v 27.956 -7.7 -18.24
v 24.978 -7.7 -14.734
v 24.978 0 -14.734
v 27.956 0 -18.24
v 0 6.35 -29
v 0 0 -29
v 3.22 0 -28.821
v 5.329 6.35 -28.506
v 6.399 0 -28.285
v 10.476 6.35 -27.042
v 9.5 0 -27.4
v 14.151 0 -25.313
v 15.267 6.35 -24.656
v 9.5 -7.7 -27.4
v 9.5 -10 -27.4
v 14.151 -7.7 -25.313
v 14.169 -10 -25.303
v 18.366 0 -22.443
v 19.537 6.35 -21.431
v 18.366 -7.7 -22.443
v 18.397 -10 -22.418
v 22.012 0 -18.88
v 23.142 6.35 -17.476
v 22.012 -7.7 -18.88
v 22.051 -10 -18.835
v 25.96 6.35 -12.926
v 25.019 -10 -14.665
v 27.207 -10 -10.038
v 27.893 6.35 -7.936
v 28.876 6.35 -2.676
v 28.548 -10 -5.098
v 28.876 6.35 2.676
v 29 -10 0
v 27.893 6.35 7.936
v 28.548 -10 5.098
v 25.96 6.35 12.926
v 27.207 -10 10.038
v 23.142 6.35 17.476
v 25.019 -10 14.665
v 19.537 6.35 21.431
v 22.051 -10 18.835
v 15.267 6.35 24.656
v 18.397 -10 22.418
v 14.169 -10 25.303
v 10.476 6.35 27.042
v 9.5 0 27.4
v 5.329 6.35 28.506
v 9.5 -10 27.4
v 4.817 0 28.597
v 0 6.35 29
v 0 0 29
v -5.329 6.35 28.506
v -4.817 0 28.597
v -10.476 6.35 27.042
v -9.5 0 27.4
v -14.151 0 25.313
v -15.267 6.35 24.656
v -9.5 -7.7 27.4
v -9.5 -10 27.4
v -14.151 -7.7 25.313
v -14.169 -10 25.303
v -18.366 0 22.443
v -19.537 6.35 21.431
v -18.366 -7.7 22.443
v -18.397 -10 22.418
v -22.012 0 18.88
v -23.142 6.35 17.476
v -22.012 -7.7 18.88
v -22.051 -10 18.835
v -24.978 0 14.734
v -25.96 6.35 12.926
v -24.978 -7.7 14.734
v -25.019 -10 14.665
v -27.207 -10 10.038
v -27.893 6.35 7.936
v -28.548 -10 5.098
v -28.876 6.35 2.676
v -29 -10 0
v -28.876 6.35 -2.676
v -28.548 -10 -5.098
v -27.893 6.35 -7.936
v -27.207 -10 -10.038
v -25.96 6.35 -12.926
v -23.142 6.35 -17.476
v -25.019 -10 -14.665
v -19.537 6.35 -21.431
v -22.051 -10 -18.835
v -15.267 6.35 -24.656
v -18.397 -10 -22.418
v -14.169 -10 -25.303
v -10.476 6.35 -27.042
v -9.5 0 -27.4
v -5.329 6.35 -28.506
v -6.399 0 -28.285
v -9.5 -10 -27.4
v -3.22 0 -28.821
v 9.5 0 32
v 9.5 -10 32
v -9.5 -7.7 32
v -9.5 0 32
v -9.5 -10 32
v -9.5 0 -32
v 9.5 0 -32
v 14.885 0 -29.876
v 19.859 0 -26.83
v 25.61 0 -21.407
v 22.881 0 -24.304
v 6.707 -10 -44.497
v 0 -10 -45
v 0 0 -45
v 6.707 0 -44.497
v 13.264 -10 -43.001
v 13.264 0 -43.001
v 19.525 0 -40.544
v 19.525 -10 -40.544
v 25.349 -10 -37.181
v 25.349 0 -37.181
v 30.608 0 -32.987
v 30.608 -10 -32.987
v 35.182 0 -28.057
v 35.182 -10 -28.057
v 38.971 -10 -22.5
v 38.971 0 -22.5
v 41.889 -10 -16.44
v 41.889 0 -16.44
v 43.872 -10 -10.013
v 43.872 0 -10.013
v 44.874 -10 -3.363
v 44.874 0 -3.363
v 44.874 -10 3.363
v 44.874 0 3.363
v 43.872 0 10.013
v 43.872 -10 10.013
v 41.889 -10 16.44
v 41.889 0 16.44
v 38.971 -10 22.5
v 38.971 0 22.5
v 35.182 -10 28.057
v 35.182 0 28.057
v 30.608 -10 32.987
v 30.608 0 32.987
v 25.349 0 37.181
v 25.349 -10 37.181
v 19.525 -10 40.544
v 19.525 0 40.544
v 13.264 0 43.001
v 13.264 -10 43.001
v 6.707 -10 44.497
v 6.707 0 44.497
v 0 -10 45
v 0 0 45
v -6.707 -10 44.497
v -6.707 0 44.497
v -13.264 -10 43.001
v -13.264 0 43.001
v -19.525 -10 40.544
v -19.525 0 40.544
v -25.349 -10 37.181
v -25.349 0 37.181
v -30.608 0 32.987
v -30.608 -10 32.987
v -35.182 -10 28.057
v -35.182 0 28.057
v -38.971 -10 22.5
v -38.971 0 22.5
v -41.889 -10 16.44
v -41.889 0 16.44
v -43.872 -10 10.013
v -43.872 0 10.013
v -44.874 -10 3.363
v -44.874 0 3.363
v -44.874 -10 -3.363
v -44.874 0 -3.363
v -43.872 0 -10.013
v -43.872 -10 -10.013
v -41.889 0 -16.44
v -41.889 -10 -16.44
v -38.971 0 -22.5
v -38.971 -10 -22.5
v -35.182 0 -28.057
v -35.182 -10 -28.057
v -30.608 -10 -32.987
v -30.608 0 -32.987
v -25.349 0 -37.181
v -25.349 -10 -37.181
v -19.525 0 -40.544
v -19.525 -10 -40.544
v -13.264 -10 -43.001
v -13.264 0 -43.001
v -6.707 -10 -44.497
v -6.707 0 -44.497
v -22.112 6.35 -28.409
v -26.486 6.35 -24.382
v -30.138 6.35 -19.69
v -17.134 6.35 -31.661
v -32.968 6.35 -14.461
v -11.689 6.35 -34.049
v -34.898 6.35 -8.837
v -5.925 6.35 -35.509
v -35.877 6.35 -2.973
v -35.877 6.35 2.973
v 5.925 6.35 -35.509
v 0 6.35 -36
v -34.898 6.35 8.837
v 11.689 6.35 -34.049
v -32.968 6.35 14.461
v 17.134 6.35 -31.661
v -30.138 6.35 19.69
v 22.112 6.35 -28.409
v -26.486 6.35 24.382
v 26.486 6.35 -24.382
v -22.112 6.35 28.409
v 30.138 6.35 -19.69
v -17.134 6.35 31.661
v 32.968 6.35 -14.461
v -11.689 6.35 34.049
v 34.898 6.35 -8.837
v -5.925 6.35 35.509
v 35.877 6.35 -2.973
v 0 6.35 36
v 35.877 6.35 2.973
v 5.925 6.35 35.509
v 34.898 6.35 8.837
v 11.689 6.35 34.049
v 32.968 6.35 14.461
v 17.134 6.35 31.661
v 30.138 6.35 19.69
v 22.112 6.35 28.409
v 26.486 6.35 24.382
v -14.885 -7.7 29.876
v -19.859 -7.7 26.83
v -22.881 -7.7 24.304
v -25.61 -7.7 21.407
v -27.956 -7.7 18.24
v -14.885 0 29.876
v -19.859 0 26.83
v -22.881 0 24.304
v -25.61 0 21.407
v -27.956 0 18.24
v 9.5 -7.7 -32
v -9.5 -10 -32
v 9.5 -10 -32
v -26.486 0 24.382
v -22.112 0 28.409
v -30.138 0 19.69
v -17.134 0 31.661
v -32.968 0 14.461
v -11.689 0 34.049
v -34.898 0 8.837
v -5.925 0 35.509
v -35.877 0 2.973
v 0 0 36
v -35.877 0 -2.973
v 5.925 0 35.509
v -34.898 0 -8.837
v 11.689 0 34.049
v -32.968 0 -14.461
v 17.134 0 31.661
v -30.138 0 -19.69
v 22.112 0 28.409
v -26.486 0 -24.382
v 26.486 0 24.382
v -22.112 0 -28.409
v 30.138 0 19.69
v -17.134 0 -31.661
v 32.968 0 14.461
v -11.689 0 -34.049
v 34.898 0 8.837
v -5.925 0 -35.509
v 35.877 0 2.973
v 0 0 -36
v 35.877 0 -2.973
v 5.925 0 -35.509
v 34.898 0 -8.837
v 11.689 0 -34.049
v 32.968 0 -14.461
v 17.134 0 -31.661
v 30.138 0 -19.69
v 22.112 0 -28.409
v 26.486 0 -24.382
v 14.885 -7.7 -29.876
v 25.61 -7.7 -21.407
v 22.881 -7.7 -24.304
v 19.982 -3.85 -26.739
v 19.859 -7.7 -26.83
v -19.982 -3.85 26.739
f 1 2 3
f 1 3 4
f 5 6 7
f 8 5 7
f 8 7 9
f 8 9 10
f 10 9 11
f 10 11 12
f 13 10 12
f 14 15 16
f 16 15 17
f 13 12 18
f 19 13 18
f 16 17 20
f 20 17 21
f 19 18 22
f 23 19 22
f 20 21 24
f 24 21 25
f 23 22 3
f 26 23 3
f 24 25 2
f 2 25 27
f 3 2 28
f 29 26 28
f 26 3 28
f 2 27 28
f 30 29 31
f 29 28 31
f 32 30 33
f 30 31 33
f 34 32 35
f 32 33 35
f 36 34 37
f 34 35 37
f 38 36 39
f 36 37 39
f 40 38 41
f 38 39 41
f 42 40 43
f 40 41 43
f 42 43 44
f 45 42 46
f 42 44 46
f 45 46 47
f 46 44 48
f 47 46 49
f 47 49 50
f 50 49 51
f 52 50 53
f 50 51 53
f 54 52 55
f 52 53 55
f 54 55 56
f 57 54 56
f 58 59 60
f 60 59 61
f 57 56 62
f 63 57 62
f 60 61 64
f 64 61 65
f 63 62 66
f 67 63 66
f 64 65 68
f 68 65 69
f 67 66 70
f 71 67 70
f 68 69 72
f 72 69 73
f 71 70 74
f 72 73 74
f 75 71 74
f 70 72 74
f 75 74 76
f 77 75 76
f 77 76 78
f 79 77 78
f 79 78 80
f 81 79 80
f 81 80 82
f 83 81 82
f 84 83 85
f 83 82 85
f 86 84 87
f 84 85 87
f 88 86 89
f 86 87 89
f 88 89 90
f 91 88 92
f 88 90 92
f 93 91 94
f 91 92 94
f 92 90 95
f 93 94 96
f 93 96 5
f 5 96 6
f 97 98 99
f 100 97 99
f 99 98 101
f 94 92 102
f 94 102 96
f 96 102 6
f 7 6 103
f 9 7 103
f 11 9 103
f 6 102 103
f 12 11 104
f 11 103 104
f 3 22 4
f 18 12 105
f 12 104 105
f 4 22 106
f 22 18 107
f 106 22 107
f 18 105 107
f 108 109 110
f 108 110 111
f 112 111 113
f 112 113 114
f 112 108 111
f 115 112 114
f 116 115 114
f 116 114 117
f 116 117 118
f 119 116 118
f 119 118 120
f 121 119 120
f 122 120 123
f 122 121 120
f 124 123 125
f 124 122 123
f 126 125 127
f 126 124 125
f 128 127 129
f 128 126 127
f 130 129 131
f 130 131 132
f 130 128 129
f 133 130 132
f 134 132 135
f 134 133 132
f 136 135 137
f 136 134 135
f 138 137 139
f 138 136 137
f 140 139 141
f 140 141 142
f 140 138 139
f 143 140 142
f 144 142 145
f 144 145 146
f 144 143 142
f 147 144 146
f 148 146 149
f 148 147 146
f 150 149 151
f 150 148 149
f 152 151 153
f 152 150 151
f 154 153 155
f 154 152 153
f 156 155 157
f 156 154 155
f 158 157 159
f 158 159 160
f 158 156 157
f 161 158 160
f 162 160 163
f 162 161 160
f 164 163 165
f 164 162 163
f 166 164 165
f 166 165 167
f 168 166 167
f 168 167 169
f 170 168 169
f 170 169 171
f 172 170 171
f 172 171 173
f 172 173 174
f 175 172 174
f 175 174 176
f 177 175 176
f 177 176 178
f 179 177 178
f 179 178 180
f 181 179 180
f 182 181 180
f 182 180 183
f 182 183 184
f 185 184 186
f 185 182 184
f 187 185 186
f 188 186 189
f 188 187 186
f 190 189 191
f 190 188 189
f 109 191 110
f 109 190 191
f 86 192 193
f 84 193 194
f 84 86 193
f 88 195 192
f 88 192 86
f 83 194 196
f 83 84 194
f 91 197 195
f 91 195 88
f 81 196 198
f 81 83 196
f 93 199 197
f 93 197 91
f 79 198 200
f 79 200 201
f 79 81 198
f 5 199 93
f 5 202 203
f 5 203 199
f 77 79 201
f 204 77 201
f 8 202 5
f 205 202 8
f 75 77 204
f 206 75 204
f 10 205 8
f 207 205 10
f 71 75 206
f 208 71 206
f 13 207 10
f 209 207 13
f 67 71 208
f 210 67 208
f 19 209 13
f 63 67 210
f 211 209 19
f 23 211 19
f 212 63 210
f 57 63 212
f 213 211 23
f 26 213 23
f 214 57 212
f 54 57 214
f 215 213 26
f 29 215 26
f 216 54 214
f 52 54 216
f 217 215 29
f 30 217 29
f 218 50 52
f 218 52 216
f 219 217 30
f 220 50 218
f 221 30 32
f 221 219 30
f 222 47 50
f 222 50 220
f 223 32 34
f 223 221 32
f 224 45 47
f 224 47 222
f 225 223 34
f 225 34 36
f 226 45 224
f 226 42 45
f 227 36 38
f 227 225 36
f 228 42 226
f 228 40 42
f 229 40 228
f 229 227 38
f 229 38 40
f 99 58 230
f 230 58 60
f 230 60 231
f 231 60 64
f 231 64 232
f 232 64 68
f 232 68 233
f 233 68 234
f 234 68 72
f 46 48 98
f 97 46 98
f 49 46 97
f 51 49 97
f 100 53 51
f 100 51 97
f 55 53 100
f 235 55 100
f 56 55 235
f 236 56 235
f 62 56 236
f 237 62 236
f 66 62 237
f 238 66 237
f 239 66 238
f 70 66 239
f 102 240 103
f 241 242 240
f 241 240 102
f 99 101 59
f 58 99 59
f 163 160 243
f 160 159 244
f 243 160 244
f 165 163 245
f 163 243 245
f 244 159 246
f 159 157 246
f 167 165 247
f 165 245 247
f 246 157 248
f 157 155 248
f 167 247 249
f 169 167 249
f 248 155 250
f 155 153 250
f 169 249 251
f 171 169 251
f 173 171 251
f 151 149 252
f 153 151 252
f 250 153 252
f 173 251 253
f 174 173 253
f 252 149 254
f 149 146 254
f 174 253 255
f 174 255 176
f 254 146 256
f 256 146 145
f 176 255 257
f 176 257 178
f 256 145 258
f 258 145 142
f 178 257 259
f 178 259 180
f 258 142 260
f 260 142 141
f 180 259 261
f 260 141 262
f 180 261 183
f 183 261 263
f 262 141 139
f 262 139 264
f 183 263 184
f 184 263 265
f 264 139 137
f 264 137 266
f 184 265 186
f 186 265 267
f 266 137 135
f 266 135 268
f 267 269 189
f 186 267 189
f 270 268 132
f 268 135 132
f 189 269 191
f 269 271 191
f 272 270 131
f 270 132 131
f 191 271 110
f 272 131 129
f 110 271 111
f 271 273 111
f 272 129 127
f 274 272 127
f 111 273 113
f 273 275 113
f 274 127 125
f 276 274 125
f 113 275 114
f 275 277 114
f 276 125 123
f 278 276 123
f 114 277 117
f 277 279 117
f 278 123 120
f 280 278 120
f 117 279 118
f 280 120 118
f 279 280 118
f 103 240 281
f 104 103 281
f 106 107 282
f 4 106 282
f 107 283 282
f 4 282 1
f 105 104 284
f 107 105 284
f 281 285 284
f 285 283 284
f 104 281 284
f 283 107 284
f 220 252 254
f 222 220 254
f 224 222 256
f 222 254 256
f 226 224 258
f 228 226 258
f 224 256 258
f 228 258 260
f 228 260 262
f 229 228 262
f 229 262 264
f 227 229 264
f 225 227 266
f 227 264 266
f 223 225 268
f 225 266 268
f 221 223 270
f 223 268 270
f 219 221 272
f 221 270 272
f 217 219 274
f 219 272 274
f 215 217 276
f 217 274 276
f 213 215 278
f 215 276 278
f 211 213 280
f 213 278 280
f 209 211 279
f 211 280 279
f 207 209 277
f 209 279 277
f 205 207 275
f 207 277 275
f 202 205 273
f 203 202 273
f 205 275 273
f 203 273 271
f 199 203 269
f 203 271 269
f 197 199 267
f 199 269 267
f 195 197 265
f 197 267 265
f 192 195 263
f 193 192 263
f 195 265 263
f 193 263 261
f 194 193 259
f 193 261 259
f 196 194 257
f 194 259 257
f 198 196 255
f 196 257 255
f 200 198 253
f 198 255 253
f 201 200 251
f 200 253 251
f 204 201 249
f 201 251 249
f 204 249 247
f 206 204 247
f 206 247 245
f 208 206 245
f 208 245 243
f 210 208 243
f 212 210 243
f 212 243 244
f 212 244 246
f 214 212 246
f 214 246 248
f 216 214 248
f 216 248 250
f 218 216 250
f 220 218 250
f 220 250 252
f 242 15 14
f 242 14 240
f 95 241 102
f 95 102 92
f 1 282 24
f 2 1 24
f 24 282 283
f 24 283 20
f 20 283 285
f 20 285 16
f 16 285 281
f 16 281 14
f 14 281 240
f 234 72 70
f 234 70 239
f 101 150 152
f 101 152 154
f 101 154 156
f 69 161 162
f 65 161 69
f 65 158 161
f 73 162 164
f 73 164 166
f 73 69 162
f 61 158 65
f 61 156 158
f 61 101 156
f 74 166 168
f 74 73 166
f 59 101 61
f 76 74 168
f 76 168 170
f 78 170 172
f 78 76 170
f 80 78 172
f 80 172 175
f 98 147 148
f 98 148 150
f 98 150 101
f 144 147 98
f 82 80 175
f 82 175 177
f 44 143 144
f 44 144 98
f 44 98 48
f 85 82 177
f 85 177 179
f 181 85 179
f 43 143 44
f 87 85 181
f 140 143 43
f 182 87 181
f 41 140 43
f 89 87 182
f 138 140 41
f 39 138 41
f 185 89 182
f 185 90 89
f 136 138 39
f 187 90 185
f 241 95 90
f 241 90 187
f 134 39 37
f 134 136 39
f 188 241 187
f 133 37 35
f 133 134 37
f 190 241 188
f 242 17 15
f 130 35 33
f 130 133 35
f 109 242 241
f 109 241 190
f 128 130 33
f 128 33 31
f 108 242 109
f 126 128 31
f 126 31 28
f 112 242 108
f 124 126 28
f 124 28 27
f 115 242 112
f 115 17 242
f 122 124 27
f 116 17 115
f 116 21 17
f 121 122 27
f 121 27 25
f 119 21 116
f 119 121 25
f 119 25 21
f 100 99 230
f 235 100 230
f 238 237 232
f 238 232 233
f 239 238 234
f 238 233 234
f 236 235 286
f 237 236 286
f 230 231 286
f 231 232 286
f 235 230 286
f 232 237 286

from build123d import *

# Parameters (mm, degrees)
SKETCH1_R           = 36
BOSS_EXTRUDE1_DEPTH = 6.35
SKETCH2_R           = 29
CUT_EXTRUDE1_DEPTH  = 52.306164347
BOSS_EXTRUDE2_START = 10
SKETCH3_R           = 45
SKETCH3_R_2         = 29
BOSS_EXTRUDE2_DEPTH = 10
CUT_EXTRUDE2_DEPTH  = 10
CUT_SWEEP1_START    = -7.7
CUT_SWEEP1_DEPTH    = 7.7
CUT_SWEEP2_START    = -7.7
CUT_SWEEP2_DEPTH    = 7.7


# Read off the part's stored shape, not the designer's step: Cut-Sweep1, Cut-Sweep2
with BuildPart() as part:
    # Sketch1 → Boss-Extrude1 (new body)
    with BuildSketch(Plane(origin=(0, 0, 0), x_dir=(1, 0, 0), z_dir=(0, 1, 0))):
        with Locations(Location((0, 0, 0), (0, 0, 270))):
            Circle(SKETCH1_R)
    extrude(amount=BOSS_EXTRUDE1_DEPTH)

    # Sketch2 → Cut-Extrude1 (cut, through all)
    with BuildSketch(Plane(origin=(0, 0, 0), x_dir=(-1, 0, 0), z_dir=(0, -1, 0))):
        with Locations(Location((0, 0, 0), (0, 0, 90))):
            Circle(SKETCH2_R)
    extrude(amount=-CUT_EXTRUDE1_DEPTH, mode=Mode.SUBTRACT)

    # Sketch3 → Boss-Extrude2 (add)
    with BuildSketch(Plane.XZ.offset(BOSS_EXTRUDE2_START)):
        with Locations(Location((0, 0, 0), (0, 0, 270))):
            Circle(SKETCH3_R)
        with Locations(Location((0, 0, 0), (0, 0, 270))):
            Circle(SKETCH3_R_2, mode=Mode.SUBTRACT)
    extrude(amount=-BOSS_EXTRUDE2_DEPTH)

    # Sketch6 → Cut-Extrude2 (cut)
    with BuildSketch(Plane(origin=(0, -10, 0), x_dir=(-1, 0, 0), z_dir=(0, -1, 0))):
        with BuildLine():
            Line((9.5, -29), (9.5, -27.399817518))
            ThreePointArc((9.5, -27.399817518), (0, -29), (-9.5, -27.399817518))
            Line((-9.5, -27.399817518), (-9.5, -29))
            Line((-9.5, -29), (-9.5, -32))
            Line((-9.5, -32), (9.5, -32))
            Line((9.5, -32), (9.5, -29))
        make_face()
        with BuildLine():
            Line((9.5, 29), (9.5, 27.399817518))
            ThreePointArc((9.5, 27.399817518), (0, 29), (-9.5, 27.399817518))
            Line((-9.5, 27.399817518), (-9.5, 29))
            Line((-9.5, 29), (-9.5, 32))
            Line((-9.5, 32), (9.5, 32))
            Line((9.5, 32), (9.5, 29))
        make_face()
    extrude(amount=-CUT_EXTRUDE2_DEPTH, mode=Mode.SUBTRACT)

    # Cut-Sweep1 outline → Cut-Sweep1 (cut)
    with BuildSketch(Plane(origin=(0, 0, 0), x_dir=(1, 0, 0), z_dir=(0, 1, 0)).offset(CUT_SWEEP1_START)):
        with BuildLine():
            add(Edge.make_bspline(
                [(9.5, 32), (13.238484468, 30.894081247), (16.809709604, 29.105075442), (23.154704566, 24.372448809), (25.850694666, 21.46020132), (27.956173262, 18.240130935)],
                knots=[0.04905898, 0.04905898, 0.04905898, 0.04905898, 0.52452949, 0.52452949, 1, 1, 1, 1], degree=3))
            Line((9.5, 32), (9.5, 27.399817518))
            ThreePointArc((9.5, 27.399817518), (18.365540323, 22.443416154), (24.978218037, 14.73392764))
            Line((24.978218037, 14.73392764), (27.956173262, 18.240130935))
        make_face()
    extrude(amount=CUT_SWEEP1_DEPTH, mode=Mode.SUBTRACT)

    # Cut-Sweep2 outline → Cut-Sweep2 (cut)
    with BuildSketch(Plane(origin=(0, 0, 0), x_dir=(1, 0, 0), z_dir=(0, 1, 0)).offset(CUT_SWEEP2_START)):
        with BuildLine():
            add(Edge.make_bspline(
                [(-9.5, -32), (-13.238484468, -30.894081248), (-16.809709604, -29.105075442), (-23.154704566, -24.372448809), (-25.850694666, -21.46020132), (-27.956173262, -18.240130935)],
                knots=[0.04905898, 0.04905898, 0.04905898, 0.04905898, 0.52452949, 0.52452949, 1, 1, 1, 1], degree=3))
            Line((-9.5, -32), (-9.5, -27.399817518))
            ThreePointArc((-9.5, -27.399817518), (-18.365540323, -22.443416154), (-24.978218037, -14.73392764))
            Line((-24.978218037, -14.73392764), (-27.956173262, -18.240130935))
        make_face()
    extrude(amount=CUT_SWEEP2_DEPTH, mode=Mode.SUBTRACT)


solid = part.part
